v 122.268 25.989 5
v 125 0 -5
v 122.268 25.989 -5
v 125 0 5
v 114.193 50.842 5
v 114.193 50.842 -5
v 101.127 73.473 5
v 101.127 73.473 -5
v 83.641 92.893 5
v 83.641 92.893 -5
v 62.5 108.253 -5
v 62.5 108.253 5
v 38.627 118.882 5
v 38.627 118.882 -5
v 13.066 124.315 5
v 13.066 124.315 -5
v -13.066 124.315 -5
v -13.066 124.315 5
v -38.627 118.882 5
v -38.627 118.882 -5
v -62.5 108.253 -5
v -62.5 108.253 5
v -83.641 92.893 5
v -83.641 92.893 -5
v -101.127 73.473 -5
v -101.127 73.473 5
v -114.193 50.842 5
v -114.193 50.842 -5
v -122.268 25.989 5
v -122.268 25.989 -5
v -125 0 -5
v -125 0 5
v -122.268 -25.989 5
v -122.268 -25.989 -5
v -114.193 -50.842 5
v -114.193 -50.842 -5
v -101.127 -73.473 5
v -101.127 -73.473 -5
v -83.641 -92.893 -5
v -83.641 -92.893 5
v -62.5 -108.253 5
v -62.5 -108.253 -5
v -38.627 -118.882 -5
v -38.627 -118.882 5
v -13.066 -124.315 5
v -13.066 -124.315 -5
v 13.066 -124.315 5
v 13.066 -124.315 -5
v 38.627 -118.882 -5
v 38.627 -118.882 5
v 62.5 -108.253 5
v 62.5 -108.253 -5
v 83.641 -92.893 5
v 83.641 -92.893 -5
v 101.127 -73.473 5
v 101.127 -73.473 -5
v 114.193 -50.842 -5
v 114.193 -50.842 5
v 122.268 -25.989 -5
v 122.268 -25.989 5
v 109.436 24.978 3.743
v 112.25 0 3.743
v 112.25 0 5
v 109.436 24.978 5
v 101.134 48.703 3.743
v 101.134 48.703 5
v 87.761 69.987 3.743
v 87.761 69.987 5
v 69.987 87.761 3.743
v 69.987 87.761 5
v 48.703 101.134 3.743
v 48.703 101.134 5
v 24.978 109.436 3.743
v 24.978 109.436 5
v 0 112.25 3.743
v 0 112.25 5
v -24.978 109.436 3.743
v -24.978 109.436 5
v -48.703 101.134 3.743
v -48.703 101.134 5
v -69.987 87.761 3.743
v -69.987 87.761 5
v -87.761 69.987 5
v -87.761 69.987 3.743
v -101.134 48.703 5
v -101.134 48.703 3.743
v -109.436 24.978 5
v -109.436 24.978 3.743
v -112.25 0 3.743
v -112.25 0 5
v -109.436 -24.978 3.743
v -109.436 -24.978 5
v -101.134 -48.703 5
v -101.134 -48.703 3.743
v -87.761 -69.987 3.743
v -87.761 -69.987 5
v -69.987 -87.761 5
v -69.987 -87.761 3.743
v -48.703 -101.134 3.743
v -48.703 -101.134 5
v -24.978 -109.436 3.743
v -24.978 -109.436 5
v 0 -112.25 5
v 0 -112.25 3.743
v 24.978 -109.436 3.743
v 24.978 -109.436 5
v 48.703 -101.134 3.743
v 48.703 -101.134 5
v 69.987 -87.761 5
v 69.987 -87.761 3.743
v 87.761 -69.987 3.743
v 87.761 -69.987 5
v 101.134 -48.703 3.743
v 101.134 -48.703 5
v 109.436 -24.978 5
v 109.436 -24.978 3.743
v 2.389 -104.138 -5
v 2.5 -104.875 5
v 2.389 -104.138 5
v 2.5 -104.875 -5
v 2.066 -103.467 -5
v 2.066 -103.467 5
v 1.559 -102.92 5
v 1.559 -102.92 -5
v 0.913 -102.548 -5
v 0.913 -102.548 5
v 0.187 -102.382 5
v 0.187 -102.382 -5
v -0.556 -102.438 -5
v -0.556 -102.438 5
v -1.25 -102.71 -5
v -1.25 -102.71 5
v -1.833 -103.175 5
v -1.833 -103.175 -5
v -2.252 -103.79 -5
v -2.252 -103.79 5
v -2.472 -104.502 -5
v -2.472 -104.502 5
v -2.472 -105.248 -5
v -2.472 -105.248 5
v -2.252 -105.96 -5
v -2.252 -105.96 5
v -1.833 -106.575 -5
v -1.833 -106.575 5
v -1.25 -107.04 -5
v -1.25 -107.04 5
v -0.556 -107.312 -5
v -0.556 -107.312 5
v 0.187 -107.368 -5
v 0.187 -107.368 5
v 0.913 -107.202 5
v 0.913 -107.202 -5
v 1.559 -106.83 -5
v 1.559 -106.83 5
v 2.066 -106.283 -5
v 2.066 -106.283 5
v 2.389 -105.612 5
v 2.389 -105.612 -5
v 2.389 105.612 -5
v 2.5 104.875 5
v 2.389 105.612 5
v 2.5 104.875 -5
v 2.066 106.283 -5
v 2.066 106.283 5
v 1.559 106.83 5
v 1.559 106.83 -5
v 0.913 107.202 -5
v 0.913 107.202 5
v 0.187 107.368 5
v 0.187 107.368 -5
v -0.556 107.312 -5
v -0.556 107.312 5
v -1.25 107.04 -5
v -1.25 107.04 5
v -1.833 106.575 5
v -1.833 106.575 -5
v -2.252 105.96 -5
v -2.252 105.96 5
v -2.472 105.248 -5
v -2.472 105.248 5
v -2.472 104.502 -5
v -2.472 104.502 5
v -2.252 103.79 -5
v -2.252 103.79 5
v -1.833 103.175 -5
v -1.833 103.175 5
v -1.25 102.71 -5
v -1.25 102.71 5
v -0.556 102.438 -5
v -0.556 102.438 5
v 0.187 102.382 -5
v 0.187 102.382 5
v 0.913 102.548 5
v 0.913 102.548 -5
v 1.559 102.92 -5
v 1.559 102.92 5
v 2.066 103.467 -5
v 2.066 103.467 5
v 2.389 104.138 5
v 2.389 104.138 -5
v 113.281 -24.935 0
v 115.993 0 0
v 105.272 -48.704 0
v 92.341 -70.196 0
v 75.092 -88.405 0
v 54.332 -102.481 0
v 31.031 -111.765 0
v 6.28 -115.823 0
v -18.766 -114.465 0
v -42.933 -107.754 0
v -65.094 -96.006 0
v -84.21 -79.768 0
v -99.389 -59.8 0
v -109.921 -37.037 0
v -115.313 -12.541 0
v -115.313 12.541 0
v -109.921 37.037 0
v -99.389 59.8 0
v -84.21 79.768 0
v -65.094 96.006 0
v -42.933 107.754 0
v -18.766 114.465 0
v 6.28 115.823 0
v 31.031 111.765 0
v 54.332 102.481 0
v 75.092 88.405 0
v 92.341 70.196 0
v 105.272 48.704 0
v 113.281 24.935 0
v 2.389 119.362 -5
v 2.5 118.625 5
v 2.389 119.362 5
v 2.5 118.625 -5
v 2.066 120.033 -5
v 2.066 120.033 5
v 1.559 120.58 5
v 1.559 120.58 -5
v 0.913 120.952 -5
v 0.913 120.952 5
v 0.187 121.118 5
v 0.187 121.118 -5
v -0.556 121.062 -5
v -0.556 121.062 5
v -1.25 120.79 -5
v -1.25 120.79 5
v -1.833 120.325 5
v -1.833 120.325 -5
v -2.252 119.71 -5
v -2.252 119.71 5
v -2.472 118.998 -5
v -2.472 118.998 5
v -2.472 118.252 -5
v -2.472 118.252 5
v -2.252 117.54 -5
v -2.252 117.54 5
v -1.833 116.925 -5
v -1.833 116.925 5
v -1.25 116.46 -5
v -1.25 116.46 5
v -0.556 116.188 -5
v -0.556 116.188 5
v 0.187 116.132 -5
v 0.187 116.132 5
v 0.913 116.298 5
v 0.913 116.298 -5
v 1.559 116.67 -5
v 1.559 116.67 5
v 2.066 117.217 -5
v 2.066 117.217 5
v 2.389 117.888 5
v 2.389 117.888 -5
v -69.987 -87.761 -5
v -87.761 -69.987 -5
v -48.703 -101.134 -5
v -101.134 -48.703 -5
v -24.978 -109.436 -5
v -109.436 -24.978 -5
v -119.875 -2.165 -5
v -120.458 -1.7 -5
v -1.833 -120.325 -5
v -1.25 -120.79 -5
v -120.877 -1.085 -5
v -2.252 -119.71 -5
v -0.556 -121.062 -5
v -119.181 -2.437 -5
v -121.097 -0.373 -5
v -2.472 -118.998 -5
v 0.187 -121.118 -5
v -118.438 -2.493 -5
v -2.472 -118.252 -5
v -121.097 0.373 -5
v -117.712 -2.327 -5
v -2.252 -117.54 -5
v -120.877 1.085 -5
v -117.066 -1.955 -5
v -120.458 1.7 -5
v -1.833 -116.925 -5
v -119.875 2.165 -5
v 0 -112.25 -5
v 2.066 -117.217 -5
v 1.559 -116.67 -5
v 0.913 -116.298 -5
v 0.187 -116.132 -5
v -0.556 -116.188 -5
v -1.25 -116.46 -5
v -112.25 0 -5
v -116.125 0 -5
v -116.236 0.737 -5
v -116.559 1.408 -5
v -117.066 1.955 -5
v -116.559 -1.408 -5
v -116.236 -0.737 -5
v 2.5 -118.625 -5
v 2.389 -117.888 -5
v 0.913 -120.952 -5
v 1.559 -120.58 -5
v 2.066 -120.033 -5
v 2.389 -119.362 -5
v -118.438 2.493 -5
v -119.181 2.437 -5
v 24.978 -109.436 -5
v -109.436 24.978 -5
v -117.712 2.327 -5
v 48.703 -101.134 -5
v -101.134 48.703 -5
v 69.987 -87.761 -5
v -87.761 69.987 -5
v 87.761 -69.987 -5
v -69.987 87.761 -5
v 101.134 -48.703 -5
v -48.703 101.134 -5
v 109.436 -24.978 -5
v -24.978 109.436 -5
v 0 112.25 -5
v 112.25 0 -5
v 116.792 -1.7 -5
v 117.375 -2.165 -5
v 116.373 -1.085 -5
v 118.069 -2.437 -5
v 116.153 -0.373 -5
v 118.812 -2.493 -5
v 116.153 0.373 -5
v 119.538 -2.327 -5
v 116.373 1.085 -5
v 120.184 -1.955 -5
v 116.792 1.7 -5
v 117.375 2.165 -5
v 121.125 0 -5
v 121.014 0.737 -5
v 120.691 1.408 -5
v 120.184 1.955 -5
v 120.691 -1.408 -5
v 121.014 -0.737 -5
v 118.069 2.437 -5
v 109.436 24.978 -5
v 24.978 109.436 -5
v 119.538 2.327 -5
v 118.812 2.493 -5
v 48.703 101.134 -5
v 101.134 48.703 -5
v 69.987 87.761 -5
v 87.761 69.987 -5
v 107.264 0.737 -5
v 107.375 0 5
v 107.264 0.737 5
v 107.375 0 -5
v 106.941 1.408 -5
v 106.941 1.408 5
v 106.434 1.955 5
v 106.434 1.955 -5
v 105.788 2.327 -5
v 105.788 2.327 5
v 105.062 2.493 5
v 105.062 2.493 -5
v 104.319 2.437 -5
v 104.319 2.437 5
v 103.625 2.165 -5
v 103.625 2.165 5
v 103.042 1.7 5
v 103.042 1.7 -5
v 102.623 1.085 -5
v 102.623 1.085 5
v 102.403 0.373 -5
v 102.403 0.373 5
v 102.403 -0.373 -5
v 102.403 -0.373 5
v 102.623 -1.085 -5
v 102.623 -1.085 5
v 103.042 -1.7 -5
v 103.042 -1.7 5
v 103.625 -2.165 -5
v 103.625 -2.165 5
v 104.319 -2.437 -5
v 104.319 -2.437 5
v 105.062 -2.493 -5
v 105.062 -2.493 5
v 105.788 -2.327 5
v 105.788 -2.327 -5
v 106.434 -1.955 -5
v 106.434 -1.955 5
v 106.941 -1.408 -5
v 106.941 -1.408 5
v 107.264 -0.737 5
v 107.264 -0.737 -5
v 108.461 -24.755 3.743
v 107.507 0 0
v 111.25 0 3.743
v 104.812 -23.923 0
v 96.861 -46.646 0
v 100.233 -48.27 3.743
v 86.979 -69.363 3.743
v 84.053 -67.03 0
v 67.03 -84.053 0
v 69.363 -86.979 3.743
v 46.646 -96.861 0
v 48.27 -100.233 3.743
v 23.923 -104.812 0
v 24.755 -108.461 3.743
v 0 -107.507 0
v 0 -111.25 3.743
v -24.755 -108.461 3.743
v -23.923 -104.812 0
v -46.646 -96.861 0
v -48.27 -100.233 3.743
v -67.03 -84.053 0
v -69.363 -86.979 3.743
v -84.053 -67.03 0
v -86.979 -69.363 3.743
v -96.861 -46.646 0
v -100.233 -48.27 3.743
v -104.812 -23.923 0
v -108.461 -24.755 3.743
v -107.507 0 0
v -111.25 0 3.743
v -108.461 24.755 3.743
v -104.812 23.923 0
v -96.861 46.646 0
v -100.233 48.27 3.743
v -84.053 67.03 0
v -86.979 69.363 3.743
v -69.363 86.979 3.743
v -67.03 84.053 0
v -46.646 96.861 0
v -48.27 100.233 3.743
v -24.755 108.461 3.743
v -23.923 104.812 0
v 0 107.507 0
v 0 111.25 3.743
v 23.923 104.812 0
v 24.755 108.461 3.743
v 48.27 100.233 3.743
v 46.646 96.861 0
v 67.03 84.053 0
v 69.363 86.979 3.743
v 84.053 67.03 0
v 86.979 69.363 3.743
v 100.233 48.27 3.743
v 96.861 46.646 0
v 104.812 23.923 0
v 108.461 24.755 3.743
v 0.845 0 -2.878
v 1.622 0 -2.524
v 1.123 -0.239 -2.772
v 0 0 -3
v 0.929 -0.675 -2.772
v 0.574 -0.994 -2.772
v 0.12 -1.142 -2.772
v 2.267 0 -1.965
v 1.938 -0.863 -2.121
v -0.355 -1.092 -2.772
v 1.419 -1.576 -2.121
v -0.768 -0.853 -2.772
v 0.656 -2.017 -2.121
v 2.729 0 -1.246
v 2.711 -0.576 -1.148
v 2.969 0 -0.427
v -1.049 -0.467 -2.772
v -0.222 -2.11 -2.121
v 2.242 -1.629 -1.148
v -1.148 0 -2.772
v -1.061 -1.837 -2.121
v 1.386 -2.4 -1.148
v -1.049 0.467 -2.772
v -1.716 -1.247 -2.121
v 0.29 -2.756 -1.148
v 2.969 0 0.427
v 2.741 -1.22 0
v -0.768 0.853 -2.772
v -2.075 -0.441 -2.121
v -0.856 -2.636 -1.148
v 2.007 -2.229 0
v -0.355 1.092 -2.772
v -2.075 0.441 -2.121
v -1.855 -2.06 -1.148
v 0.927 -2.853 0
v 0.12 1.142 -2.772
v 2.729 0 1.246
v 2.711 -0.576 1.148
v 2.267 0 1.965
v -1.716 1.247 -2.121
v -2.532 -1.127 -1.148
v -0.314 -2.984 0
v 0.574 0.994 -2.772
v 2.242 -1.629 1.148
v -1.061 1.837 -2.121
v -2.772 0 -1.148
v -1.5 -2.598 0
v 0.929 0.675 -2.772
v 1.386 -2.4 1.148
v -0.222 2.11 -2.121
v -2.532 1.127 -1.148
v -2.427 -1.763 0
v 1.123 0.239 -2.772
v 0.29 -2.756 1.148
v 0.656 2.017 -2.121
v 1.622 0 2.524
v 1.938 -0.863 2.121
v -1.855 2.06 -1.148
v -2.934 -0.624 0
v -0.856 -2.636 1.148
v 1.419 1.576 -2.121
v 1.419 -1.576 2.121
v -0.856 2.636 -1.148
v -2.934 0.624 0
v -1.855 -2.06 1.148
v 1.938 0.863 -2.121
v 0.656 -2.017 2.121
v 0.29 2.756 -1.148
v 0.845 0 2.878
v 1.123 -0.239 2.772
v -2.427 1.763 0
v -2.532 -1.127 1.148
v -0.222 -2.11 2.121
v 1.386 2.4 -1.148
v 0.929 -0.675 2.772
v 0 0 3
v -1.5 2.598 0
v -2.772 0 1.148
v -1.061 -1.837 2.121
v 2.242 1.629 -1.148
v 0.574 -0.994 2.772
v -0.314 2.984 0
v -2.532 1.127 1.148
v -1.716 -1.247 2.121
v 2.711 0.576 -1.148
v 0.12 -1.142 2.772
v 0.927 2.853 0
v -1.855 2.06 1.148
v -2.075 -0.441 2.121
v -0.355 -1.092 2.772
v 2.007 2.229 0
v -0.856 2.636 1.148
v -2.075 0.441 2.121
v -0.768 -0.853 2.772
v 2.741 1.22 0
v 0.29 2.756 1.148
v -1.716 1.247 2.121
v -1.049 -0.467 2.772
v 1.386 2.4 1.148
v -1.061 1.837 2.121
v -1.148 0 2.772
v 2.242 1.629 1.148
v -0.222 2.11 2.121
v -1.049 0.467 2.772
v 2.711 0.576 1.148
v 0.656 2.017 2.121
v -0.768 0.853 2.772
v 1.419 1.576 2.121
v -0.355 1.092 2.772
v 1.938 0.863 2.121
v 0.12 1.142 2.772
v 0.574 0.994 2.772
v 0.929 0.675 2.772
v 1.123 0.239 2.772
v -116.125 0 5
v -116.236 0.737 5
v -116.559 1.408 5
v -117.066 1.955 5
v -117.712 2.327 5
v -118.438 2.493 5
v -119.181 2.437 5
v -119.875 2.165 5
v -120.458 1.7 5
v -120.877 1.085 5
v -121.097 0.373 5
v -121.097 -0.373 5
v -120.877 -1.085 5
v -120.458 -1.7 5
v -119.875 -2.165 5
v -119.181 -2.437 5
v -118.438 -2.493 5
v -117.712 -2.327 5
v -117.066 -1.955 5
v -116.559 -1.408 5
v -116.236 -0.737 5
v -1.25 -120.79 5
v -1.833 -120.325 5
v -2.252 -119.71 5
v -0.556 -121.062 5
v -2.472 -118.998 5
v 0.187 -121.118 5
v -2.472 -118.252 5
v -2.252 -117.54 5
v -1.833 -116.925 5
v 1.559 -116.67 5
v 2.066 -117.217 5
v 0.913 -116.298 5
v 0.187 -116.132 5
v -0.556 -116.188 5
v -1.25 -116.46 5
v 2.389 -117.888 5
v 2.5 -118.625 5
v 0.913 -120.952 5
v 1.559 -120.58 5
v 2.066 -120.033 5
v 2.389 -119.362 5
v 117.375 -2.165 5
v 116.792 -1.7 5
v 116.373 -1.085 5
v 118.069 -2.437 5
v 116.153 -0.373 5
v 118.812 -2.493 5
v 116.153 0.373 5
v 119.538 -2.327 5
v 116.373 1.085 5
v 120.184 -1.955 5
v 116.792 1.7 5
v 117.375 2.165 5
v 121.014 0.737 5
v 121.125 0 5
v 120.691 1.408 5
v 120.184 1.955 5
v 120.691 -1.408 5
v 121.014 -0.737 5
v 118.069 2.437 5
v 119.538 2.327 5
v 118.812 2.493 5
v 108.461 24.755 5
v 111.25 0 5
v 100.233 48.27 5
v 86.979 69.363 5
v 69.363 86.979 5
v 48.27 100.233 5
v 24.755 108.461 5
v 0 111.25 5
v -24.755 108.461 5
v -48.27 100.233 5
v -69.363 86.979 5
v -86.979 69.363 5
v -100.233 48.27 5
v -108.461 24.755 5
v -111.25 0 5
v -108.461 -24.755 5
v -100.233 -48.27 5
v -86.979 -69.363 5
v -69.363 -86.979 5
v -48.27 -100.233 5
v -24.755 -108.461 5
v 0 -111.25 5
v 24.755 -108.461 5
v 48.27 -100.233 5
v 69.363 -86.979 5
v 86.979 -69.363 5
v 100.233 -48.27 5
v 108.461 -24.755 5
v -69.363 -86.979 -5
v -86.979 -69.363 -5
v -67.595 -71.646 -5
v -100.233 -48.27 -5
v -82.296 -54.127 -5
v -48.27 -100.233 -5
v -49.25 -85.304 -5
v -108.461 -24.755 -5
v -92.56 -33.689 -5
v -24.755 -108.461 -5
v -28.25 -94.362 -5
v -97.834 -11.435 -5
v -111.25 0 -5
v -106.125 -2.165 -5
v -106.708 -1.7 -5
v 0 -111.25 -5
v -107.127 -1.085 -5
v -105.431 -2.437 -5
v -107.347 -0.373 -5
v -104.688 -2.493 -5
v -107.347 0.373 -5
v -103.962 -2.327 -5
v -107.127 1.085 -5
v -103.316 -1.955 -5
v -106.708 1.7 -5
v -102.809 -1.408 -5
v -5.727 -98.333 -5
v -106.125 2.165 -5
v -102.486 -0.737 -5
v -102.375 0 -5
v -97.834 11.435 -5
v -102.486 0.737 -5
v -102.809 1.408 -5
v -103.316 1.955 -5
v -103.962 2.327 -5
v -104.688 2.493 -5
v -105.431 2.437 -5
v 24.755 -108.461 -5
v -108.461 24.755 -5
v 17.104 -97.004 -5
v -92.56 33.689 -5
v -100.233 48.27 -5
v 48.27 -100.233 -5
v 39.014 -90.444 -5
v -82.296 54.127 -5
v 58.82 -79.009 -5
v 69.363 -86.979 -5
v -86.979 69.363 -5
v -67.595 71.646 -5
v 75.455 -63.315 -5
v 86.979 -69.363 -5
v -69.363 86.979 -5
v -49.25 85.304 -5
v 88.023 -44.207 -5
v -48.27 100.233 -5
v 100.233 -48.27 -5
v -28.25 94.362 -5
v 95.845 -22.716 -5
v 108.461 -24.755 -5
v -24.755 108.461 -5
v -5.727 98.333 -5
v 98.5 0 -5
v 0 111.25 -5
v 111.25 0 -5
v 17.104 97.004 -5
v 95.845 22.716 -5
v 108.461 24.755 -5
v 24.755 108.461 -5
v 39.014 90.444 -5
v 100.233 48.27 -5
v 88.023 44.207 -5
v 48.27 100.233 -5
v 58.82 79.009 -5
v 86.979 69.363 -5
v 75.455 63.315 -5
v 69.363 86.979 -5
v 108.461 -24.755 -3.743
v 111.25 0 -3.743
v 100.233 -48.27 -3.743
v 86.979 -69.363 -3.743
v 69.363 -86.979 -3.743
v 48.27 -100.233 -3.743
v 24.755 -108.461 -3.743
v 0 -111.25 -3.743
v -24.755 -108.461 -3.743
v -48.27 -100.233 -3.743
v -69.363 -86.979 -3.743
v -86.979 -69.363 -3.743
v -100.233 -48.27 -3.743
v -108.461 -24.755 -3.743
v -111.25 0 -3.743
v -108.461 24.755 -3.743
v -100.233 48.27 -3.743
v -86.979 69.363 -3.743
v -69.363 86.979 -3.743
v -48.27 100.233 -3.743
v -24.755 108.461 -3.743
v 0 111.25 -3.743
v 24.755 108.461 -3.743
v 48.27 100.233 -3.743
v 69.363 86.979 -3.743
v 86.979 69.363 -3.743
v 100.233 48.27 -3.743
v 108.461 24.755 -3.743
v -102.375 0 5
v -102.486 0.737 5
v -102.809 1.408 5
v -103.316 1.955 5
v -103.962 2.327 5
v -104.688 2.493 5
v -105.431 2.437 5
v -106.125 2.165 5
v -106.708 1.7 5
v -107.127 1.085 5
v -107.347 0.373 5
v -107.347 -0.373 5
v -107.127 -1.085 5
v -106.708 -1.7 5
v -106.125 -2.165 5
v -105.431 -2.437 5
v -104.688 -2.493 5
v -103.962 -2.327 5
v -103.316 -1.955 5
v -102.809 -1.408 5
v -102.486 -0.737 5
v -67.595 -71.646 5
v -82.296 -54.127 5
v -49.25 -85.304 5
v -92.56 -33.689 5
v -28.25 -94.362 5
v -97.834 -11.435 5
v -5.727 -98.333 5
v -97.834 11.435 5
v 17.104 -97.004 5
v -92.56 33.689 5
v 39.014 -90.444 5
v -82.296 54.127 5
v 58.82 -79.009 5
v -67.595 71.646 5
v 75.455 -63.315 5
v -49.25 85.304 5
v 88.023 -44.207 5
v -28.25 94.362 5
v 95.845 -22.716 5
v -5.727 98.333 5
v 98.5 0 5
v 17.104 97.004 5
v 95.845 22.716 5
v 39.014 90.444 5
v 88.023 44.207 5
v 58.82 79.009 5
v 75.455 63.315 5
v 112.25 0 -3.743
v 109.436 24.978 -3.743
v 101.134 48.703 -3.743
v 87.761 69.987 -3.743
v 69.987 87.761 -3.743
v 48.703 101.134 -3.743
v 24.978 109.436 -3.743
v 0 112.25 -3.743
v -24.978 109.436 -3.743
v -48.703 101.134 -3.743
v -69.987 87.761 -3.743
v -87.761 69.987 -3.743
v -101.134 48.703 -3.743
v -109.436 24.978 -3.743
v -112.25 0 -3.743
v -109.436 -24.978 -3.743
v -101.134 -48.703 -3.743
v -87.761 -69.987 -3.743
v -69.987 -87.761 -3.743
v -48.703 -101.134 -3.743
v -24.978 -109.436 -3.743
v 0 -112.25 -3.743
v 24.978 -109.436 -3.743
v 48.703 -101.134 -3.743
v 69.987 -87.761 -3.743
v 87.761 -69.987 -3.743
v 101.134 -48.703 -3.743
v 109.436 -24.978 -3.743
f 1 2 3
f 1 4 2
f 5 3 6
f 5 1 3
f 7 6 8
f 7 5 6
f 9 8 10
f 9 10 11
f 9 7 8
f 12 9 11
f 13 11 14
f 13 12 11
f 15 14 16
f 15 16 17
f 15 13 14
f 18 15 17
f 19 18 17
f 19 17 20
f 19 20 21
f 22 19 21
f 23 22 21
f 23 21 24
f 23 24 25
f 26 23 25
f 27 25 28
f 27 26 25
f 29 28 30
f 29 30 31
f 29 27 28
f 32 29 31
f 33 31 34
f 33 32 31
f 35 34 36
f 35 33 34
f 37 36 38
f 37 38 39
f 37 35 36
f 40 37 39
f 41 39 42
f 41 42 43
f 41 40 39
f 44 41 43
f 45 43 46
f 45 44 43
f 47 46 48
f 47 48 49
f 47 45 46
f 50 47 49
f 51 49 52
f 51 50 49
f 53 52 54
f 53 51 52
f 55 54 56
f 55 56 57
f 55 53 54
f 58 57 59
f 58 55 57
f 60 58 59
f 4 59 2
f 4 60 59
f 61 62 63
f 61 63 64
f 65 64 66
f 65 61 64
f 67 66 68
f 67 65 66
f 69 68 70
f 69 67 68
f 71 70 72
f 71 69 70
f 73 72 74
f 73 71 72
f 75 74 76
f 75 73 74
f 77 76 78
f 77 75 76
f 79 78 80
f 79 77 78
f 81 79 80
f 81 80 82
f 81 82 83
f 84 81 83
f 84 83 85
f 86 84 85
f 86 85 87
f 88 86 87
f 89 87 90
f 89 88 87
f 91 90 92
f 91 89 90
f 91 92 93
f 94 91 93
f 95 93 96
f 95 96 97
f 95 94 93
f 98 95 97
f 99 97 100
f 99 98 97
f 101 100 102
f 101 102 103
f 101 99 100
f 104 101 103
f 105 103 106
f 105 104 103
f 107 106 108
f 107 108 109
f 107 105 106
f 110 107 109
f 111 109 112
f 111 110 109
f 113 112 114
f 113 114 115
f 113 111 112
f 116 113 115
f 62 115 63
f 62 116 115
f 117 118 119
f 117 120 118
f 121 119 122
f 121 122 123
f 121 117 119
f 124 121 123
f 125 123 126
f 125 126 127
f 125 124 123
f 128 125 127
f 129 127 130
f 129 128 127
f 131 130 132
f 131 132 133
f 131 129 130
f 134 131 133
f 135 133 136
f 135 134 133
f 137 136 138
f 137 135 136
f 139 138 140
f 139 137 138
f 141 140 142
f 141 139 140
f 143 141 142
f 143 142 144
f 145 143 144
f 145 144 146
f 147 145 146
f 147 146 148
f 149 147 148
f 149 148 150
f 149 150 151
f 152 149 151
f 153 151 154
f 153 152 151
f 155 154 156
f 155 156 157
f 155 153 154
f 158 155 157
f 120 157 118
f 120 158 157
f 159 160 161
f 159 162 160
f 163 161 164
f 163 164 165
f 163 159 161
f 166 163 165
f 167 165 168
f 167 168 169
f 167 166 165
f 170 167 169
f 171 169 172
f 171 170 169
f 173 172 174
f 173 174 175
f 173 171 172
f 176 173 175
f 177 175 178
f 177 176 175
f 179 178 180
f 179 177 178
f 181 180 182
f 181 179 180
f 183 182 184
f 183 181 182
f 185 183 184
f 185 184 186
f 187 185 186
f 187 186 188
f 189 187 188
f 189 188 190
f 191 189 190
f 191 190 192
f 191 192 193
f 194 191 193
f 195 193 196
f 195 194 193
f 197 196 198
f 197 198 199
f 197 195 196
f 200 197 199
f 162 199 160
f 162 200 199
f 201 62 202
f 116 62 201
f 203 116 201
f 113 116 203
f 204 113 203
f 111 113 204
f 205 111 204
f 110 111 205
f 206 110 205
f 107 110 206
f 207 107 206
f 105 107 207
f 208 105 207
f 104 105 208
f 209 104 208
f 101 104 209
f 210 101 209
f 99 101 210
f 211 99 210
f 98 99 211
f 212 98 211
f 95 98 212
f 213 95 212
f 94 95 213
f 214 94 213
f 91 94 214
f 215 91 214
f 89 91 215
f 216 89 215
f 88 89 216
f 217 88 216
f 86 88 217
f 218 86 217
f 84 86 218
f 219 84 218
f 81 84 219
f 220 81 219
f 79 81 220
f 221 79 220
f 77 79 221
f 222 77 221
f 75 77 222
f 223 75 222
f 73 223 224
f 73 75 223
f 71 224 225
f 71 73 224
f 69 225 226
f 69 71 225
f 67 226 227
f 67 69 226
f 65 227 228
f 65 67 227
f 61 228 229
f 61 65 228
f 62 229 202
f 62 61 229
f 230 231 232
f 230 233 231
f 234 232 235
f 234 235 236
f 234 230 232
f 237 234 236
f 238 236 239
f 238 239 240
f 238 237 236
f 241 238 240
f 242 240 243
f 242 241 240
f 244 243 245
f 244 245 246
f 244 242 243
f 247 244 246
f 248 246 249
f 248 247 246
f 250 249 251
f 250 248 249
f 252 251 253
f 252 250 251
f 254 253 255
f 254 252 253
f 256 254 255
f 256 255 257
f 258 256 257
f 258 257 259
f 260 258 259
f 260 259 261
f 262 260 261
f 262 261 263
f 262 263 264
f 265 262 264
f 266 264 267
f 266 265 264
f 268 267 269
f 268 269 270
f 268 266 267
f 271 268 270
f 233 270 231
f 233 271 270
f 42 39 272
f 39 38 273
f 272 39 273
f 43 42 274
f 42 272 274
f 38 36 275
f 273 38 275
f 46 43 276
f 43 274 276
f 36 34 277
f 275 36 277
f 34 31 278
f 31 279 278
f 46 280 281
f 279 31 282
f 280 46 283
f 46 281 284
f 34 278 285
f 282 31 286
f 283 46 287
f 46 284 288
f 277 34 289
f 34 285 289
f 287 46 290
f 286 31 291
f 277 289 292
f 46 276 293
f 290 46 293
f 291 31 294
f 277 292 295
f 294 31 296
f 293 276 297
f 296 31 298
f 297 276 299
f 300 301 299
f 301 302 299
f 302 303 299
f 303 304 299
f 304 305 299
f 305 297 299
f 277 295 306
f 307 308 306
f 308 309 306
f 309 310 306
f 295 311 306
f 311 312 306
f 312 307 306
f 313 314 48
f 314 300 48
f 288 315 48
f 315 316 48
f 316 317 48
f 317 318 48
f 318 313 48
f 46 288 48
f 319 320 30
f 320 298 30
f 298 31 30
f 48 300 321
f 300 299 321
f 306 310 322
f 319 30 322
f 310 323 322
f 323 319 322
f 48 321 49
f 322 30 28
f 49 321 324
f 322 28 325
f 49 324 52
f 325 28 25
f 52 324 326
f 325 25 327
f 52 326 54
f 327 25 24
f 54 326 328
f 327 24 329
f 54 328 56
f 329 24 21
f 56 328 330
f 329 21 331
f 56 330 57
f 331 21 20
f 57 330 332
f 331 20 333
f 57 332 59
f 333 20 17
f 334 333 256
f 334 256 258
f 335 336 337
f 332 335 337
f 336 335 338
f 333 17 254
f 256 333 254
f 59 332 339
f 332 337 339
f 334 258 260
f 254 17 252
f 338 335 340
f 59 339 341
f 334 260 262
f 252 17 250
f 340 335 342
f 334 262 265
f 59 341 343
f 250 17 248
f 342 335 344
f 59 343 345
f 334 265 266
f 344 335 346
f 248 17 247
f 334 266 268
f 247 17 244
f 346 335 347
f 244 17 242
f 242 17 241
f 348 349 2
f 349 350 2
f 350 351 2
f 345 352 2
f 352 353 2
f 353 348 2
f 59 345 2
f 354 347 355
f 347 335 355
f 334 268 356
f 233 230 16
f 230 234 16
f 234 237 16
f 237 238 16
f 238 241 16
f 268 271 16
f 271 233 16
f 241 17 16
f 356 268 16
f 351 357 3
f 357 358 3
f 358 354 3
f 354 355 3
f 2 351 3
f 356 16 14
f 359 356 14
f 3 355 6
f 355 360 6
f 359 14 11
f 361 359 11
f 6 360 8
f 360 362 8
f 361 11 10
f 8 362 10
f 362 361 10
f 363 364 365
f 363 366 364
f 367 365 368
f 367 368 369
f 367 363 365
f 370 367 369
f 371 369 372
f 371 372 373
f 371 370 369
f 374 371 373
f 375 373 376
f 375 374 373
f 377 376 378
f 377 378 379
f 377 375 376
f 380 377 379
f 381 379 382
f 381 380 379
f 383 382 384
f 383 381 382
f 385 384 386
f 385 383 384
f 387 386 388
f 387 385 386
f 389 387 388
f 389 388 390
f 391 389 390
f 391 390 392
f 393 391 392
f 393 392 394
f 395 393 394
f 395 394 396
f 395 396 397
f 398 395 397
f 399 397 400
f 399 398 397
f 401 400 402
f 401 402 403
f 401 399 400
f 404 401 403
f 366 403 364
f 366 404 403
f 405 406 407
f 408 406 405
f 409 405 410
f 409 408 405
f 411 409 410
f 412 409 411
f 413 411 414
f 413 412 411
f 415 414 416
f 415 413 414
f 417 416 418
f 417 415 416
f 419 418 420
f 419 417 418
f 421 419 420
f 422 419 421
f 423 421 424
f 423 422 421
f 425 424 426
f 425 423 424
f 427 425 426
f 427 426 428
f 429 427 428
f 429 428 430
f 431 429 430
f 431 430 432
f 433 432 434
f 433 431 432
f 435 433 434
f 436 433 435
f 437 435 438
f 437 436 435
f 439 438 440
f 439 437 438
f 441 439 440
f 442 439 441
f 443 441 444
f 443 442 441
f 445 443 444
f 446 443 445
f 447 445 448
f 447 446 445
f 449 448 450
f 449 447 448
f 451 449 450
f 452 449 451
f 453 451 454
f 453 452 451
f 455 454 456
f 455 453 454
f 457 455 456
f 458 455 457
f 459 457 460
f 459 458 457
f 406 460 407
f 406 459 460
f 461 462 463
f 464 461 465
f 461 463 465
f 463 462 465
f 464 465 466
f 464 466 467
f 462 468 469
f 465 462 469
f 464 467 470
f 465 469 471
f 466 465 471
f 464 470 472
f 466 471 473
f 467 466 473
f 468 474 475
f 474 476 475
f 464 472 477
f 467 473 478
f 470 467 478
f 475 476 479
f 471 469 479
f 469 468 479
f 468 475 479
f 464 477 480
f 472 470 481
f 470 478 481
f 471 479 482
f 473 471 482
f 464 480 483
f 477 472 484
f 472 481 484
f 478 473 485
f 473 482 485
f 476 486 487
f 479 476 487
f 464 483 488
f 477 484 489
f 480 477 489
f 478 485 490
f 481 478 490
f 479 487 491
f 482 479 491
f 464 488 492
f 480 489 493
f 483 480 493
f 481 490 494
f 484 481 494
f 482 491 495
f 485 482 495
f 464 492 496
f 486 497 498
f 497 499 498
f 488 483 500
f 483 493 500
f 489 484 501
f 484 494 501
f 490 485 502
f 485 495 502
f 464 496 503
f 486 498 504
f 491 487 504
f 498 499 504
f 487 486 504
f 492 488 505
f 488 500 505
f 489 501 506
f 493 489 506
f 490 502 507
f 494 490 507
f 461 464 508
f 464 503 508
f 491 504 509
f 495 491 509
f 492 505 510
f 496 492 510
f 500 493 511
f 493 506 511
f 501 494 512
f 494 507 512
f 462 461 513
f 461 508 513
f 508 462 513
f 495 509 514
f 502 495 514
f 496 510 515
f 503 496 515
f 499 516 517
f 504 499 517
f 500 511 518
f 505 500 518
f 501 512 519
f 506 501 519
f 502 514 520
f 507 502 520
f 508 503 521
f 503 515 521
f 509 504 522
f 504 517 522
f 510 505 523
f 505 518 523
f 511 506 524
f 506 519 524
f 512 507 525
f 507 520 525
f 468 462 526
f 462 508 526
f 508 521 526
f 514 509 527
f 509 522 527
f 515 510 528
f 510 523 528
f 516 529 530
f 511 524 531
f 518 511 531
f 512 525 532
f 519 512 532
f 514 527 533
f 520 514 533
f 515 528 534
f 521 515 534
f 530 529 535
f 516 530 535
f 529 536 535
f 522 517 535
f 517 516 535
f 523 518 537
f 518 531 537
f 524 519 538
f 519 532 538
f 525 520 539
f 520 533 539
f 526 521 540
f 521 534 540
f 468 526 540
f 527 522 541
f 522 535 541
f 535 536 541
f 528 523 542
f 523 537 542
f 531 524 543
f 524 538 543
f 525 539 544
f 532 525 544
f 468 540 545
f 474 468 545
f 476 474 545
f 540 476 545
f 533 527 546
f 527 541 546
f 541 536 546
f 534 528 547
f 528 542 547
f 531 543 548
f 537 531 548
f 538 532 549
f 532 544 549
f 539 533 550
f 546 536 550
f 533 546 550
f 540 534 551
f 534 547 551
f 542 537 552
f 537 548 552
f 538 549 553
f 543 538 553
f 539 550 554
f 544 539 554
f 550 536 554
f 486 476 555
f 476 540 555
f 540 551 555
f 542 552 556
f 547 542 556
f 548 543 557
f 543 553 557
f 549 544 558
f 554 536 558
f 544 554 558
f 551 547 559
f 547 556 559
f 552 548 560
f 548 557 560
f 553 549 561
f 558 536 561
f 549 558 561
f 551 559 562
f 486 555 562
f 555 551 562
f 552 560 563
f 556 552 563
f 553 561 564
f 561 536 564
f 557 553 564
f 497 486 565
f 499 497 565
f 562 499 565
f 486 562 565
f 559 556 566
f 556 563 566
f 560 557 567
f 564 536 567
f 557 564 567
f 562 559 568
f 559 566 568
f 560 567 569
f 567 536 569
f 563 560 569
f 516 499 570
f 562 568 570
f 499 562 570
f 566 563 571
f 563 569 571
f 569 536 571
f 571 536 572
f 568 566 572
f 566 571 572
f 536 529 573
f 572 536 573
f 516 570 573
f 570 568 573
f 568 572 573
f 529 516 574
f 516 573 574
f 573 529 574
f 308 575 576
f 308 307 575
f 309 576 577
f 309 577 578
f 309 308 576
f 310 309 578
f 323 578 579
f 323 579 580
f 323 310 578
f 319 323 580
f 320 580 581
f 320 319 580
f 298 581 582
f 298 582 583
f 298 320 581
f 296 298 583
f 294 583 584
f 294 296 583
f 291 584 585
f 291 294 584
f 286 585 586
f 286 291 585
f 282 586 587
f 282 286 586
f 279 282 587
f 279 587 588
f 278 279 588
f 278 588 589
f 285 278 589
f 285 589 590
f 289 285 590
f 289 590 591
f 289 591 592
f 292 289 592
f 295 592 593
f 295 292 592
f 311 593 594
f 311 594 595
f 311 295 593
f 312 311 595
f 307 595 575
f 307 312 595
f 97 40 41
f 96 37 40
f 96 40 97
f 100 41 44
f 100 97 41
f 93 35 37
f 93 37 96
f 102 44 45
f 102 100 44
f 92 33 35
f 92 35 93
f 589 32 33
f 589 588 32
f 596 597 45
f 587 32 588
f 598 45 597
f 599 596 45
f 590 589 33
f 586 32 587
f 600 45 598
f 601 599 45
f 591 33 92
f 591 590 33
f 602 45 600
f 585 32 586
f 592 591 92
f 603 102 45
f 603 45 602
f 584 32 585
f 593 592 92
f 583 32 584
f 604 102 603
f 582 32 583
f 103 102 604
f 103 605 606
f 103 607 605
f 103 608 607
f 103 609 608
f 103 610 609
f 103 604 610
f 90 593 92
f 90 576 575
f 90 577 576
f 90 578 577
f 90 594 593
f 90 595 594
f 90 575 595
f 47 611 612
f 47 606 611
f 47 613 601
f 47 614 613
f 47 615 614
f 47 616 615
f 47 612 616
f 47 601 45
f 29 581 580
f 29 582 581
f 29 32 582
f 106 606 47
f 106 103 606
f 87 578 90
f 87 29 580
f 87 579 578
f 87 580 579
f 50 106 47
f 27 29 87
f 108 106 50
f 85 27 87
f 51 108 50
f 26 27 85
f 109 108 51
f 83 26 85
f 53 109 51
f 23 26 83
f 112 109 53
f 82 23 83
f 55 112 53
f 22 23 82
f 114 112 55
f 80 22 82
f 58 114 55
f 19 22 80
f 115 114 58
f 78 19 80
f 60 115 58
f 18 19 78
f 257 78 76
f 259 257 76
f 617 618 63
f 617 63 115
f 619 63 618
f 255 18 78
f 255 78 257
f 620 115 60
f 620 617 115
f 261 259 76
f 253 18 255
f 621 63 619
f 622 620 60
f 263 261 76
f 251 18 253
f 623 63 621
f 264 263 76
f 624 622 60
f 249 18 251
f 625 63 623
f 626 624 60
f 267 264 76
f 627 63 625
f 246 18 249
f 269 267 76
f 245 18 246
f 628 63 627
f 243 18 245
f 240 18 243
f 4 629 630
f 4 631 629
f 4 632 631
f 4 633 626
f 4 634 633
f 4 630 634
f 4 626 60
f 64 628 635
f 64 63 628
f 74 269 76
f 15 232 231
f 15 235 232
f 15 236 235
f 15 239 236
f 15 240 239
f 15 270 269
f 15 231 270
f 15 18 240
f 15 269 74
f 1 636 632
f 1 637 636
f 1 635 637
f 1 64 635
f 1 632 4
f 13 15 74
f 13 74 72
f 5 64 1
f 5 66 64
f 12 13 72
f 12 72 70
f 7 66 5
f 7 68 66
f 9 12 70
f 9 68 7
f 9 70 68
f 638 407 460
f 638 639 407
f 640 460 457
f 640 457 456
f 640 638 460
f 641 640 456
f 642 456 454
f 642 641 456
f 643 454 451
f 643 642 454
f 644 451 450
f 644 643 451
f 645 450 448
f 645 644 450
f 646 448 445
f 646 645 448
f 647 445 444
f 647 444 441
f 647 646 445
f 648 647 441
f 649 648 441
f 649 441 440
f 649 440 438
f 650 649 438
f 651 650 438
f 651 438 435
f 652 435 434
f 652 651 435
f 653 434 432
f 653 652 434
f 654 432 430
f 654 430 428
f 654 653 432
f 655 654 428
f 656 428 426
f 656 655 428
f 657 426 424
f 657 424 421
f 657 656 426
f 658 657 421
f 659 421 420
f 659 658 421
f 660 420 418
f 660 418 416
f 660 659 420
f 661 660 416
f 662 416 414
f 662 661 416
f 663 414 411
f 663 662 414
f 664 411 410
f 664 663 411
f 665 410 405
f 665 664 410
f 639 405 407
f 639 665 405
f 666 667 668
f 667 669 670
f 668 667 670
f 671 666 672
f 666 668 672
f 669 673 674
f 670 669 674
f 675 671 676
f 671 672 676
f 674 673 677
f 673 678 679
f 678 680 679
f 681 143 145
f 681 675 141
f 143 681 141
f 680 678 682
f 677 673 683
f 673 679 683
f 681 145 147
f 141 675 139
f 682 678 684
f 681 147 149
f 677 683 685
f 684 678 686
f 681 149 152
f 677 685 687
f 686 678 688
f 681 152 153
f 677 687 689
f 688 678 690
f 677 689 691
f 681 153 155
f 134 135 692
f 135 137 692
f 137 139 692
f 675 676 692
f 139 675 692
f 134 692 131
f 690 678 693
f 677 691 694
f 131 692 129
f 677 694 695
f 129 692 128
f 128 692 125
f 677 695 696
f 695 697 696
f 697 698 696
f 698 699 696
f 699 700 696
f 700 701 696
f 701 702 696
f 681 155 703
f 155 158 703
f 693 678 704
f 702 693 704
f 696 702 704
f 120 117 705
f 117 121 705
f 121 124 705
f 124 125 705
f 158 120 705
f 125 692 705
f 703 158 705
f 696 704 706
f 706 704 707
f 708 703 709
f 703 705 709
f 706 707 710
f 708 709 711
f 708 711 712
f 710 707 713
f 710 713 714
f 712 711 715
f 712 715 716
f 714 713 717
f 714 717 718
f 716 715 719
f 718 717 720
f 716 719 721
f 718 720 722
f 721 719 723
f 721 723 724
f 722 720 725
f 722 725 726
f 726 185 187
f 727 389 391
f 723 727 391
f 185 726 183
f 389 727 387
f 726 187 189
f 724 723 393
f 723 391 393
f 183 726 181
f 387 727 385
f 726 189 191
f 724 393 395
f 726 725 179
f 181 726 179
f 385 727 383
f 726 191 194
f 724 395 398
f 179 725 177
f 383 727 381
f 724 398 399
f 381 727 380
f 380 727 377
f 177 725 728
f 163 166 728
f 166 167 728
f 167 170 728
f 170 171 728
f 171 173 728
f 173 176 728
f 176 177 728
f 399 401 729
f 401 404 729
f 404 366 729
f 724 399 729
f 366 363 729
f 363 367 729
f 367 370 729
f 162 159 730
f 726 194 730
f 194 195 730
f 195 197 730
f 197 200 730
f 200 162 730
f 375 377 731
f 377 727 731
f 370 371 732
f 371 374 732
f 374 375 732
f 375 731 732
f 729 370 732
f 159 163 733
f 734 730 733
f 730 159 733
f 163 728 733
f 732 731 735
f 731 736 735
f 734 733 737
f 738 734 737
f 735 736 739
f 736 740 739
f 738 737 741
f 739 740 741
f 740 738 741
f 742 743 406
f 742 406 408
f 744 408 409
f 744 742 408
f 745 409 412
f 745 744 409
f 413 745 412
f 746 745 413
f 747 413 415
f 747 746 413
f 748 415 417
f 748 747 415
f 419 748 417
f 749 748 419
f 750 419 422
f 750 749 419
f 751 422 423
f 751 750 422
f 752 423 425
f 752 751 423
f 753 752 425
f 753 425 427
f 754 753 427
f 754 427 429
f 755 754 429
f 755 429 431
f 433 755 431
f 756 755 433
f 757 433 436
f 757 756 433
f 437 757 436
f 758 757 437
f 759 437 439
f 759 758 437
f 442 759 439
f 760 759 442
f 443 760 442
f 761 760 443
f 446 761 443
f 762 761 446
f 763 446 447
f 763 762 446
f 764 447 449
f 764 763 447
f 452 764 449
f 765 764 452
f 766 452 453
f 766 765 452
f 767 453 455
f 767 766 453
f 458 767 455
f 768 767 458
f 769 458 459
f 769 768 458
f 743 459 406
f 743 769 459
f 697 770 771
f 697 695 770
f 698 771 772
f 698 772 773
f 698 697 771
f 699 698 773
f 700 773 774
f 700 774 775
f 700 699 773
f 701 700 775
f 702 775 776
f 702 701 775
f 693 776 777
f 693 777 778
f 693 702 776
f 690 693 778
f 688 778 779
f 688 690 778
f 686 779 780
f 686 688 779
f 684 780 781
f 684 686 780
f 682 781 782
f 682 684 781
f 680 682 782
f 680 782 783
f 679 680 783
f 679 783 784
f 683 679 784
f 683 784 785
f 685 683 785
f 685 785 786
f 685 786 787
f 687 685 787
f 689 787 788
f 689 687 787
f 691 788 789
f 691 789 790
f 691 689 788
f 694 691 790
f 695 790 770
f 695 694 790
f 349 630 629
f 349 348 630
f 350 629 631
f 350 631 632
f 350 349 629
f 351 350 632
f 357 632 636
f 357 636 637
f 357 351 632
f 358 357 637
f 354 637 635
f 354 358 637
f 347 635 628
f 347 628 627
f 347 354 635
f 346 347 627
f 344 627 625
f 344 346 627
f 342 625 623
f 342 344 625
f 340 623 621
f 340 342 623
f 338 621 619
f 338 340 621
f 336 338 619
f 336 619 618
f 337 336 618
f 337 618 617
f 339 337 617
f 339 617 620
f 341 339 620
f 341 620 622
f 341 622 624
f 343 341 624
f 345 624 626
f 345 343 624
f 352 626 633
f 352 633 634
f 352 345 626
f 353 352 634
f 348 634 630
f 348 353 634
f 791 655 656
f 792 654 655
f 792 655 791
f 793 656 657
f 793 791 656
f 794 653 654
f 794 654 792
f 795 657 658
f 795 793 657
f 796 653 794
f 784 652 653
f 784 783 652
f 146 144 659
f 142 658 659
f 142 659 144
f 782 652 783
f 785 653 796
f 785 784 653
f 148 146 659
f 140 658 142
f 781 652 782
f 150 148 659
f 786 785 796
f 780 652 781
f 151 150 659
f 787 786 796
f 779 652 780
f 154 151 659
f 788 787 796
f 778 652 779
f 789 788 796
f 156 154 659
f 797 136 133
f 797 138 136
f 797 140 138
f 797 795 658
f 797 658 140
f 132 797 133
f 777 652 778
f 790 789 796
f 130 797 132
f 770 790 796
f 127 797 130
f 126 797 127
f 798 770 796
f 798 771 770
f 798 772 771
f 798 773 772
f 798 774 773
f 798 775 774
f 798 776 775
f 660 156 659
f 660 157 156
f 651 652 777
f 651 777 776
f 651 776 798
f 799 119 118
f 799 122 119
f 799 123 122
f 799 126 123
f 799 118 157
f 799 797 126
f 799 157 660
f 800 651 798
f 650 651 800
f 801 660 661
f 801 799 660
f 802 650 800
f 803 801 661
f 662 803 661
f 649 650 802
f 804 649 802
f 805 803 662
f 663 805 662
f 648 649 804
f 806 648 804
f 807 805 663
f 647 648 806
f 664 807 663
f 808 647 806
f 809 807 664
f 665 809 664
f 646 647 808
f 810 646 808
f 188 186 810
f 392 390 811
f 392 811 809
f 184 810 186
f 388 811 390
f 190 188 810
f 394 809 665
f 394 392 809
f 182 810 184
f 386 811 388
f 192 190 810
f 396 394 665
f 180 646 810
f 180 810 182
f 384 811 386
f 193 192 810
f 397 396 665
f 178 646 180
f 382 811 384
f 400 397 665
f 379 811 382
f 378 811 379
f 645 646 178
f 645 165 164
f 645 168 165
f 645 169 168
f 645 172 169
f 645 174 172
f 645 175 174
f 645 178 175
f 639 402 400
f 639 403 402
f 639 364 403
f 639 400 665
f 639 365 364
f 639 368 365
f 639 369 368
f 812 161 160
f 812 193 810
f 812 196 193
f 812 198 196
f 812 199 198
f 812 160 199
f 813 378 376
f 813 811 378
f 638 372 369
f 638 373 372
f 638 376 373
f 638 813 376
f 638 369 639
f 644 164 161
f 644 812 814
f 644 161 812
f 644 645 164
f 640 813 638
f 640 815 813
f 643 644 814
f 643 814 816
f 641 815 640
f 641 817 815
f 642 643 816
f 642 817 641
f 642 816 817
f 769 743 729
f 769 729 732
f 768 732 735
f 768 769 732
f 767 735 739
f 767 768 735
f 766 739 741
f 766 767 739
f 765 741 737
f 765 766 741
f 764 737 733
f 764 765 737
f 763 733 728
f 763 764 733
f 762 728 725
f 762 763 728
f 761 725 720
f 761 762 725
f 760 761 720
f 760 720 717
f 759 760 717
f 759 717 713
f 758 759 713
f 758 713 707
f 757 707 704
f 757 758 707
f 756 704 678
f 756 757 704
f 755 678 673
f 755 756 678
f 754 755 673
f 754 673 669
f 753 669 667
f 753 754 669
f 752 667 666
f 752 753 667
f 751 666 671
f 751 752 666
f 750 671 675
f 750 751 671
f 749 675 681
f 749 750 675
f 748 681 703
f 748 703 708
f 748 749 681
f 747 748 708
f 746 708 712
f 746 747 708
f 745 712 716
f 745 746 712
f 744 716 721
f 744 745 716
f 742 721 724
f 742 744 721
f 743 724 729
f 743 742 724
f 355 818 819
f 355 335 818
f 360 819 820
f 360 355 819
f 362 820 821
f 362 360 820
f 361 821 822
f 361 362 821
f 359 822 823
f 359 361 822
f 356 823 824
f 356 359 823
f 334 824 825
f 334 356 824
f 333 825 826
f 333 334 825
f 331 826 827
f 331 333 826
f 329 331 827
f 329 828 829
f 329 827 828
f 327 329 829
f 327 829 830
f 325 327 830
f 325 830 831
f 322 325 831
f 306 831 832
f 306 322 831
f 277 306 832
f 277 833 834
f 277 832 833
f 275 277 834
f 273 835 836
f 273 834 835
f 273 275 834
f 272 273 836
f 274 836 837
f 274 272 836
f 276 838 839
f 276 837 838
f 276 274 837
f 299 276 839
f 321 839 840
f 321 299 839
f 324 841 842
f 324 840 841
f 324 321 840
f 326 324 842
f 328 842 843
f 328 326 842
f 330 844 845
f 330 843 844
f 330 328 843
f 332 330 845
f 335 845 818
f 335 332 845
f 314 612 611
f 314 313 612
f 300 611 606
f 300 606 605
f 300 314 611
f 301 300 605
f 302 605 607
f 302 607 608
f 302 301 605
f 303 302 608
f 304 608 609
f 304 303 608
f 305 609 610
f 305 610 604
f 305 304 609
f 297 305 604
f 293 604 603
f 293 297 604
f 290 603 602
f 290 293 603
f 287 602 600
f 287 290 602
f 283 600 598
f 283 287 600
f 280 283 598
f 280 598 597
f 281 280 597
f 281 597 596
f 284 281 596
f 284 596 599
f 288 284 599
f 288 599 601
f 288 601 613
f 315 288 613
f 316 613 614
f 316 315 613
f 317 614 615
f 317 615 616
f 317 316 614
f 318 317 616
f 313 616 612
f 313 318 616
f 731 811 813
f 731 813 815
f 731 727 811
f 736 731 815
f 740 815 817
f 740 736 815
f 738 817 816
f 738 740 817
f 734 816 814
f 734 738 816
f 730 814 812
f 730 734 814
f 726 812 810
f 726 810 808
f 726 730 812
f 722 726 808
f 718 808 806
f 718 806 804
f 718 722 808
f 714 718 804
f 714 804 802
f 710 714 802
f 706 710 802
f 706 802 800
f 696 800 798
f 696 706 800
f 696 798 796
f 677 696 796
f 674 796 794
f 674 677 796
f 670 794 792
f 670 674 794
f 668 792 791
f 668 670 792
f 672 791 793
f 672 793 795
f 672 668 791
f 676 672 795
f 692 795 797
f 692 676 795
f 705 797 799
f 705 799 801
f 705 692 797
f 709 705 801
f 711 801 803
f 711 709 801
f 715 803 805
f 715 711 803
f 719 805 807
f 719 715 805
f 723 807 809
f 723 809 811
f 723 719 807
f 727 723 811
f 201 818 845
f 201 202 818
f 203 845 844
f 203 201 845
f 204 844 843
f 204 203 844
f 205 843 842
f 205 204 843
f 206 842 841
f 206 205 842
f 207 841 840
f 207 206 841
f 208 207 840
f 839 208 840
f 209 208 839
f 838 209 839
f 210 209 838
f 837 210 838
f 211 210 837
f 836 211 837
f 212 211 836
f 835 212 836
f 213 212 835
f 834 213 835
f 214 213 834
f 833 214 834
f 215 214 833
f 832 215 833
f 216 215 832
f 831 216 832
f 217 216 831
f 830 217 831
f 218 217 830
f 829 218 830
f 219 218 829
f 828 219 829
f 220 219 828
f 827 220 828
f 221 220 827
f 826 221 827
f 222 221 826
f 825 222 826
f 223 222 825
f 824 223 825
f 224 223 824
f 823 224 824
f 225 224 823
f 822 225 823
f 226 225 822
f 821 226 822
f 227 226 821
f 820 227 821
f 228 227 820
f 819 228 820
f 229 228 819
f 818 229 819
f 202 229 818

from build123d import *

# Parameters (mm, degrees)
F1_R     = 125
F1_R_2   = 2.5
F1_R_3   = 112.25
F2_DEPTH = 5
F3_R     = 111.25
F3_R_2   = 2.5
F3_R_3   = 98.5
F4_DEPTH = 5


with BuildPart() as f2:
    # F1 (on Top) → F2 (new body, symmetric)
    with BuildSketch(Plane.XY):
        Circle(F1_R)
        with Locations((0, -118.625)):
            Circle(F1_R_2, mode=Mode.SUBTRACT)
        with Locations((-118.625, 0)):
            Circle(F1_R_2, mode=Mode.SUBTRACT)
        Circle(F1_R_3, mode=Mode.SUBTRACT)
        with Locations((118.625, 0)):
            Circle(F1_R_2, mode=Mode.SUBTRACT)
        with Locations((0, 118.625)):
            Circle(F1_R_2, mode=Mode.SUBTRACT)
    extrude(amount=F2_DEPTH, both=True)


with BuildPart() as f4:
    # F3 (on Top) → F4 (new body, symmetric)
    with BuildSketch(Plane.XY):
        Circle(F3_R)
        with Locations((0, -104.875)):
            Circle(F3_R_2, mode=Mode.SUBTRACT)
        with Locations((-104.875, 0)):
            Circle(F3_R_2, mode=Mode.SUBTRACT)
        Circle(F3_R_3, mode=Mode.SUBTRACT)
        with Locations((104.875, 0)):
            Circle(F3_R_2, mode=Mode.SUBTRACT)
        with Locations((0, 104.875)):
            Circle(F3_R_2, mode=Mode.SUBTRACT)
    extrude(amount=F4_DEPTH, both=True)


with BuildPart() as f6:
    # F5 (on Front) → F6 (revolve)
    with BuildSketch(Plane.XZ):
        Polygon((115.9926406871, 0), (111.75, 4.2426406871), (107.5073593129, 0), (111.75, -4.2426406871), align=None)
    revolve(axis=Axis((0, 0, 0), (0, 0, -1)))


with BuildPart() as f2_1:
    add(f2.part)

    # F7: cut F6
    add(f6.part, mode=Mode.SUBTRACT)


with BuildPart() as f4_1:
    add(f4.part)

    # F7: cut F6
    add(f6.part, mode=Mode.SUBTRACT)


with BuildPart() as f9:
    # F8 (on Front) → F9 (revolve)
    with BuildSketch(Plane.XZ):
        with BuildLine():
            Line((0, 3), (0, -3))
            ThreePointArc((0, -3), (3, 0), (0, 3))
        make_face()
    revolve(axis=Axis((0, 0, 0), (0, 0, -1)))


solid = Compound([f2_1.part, f4_1.part, f9.part])
